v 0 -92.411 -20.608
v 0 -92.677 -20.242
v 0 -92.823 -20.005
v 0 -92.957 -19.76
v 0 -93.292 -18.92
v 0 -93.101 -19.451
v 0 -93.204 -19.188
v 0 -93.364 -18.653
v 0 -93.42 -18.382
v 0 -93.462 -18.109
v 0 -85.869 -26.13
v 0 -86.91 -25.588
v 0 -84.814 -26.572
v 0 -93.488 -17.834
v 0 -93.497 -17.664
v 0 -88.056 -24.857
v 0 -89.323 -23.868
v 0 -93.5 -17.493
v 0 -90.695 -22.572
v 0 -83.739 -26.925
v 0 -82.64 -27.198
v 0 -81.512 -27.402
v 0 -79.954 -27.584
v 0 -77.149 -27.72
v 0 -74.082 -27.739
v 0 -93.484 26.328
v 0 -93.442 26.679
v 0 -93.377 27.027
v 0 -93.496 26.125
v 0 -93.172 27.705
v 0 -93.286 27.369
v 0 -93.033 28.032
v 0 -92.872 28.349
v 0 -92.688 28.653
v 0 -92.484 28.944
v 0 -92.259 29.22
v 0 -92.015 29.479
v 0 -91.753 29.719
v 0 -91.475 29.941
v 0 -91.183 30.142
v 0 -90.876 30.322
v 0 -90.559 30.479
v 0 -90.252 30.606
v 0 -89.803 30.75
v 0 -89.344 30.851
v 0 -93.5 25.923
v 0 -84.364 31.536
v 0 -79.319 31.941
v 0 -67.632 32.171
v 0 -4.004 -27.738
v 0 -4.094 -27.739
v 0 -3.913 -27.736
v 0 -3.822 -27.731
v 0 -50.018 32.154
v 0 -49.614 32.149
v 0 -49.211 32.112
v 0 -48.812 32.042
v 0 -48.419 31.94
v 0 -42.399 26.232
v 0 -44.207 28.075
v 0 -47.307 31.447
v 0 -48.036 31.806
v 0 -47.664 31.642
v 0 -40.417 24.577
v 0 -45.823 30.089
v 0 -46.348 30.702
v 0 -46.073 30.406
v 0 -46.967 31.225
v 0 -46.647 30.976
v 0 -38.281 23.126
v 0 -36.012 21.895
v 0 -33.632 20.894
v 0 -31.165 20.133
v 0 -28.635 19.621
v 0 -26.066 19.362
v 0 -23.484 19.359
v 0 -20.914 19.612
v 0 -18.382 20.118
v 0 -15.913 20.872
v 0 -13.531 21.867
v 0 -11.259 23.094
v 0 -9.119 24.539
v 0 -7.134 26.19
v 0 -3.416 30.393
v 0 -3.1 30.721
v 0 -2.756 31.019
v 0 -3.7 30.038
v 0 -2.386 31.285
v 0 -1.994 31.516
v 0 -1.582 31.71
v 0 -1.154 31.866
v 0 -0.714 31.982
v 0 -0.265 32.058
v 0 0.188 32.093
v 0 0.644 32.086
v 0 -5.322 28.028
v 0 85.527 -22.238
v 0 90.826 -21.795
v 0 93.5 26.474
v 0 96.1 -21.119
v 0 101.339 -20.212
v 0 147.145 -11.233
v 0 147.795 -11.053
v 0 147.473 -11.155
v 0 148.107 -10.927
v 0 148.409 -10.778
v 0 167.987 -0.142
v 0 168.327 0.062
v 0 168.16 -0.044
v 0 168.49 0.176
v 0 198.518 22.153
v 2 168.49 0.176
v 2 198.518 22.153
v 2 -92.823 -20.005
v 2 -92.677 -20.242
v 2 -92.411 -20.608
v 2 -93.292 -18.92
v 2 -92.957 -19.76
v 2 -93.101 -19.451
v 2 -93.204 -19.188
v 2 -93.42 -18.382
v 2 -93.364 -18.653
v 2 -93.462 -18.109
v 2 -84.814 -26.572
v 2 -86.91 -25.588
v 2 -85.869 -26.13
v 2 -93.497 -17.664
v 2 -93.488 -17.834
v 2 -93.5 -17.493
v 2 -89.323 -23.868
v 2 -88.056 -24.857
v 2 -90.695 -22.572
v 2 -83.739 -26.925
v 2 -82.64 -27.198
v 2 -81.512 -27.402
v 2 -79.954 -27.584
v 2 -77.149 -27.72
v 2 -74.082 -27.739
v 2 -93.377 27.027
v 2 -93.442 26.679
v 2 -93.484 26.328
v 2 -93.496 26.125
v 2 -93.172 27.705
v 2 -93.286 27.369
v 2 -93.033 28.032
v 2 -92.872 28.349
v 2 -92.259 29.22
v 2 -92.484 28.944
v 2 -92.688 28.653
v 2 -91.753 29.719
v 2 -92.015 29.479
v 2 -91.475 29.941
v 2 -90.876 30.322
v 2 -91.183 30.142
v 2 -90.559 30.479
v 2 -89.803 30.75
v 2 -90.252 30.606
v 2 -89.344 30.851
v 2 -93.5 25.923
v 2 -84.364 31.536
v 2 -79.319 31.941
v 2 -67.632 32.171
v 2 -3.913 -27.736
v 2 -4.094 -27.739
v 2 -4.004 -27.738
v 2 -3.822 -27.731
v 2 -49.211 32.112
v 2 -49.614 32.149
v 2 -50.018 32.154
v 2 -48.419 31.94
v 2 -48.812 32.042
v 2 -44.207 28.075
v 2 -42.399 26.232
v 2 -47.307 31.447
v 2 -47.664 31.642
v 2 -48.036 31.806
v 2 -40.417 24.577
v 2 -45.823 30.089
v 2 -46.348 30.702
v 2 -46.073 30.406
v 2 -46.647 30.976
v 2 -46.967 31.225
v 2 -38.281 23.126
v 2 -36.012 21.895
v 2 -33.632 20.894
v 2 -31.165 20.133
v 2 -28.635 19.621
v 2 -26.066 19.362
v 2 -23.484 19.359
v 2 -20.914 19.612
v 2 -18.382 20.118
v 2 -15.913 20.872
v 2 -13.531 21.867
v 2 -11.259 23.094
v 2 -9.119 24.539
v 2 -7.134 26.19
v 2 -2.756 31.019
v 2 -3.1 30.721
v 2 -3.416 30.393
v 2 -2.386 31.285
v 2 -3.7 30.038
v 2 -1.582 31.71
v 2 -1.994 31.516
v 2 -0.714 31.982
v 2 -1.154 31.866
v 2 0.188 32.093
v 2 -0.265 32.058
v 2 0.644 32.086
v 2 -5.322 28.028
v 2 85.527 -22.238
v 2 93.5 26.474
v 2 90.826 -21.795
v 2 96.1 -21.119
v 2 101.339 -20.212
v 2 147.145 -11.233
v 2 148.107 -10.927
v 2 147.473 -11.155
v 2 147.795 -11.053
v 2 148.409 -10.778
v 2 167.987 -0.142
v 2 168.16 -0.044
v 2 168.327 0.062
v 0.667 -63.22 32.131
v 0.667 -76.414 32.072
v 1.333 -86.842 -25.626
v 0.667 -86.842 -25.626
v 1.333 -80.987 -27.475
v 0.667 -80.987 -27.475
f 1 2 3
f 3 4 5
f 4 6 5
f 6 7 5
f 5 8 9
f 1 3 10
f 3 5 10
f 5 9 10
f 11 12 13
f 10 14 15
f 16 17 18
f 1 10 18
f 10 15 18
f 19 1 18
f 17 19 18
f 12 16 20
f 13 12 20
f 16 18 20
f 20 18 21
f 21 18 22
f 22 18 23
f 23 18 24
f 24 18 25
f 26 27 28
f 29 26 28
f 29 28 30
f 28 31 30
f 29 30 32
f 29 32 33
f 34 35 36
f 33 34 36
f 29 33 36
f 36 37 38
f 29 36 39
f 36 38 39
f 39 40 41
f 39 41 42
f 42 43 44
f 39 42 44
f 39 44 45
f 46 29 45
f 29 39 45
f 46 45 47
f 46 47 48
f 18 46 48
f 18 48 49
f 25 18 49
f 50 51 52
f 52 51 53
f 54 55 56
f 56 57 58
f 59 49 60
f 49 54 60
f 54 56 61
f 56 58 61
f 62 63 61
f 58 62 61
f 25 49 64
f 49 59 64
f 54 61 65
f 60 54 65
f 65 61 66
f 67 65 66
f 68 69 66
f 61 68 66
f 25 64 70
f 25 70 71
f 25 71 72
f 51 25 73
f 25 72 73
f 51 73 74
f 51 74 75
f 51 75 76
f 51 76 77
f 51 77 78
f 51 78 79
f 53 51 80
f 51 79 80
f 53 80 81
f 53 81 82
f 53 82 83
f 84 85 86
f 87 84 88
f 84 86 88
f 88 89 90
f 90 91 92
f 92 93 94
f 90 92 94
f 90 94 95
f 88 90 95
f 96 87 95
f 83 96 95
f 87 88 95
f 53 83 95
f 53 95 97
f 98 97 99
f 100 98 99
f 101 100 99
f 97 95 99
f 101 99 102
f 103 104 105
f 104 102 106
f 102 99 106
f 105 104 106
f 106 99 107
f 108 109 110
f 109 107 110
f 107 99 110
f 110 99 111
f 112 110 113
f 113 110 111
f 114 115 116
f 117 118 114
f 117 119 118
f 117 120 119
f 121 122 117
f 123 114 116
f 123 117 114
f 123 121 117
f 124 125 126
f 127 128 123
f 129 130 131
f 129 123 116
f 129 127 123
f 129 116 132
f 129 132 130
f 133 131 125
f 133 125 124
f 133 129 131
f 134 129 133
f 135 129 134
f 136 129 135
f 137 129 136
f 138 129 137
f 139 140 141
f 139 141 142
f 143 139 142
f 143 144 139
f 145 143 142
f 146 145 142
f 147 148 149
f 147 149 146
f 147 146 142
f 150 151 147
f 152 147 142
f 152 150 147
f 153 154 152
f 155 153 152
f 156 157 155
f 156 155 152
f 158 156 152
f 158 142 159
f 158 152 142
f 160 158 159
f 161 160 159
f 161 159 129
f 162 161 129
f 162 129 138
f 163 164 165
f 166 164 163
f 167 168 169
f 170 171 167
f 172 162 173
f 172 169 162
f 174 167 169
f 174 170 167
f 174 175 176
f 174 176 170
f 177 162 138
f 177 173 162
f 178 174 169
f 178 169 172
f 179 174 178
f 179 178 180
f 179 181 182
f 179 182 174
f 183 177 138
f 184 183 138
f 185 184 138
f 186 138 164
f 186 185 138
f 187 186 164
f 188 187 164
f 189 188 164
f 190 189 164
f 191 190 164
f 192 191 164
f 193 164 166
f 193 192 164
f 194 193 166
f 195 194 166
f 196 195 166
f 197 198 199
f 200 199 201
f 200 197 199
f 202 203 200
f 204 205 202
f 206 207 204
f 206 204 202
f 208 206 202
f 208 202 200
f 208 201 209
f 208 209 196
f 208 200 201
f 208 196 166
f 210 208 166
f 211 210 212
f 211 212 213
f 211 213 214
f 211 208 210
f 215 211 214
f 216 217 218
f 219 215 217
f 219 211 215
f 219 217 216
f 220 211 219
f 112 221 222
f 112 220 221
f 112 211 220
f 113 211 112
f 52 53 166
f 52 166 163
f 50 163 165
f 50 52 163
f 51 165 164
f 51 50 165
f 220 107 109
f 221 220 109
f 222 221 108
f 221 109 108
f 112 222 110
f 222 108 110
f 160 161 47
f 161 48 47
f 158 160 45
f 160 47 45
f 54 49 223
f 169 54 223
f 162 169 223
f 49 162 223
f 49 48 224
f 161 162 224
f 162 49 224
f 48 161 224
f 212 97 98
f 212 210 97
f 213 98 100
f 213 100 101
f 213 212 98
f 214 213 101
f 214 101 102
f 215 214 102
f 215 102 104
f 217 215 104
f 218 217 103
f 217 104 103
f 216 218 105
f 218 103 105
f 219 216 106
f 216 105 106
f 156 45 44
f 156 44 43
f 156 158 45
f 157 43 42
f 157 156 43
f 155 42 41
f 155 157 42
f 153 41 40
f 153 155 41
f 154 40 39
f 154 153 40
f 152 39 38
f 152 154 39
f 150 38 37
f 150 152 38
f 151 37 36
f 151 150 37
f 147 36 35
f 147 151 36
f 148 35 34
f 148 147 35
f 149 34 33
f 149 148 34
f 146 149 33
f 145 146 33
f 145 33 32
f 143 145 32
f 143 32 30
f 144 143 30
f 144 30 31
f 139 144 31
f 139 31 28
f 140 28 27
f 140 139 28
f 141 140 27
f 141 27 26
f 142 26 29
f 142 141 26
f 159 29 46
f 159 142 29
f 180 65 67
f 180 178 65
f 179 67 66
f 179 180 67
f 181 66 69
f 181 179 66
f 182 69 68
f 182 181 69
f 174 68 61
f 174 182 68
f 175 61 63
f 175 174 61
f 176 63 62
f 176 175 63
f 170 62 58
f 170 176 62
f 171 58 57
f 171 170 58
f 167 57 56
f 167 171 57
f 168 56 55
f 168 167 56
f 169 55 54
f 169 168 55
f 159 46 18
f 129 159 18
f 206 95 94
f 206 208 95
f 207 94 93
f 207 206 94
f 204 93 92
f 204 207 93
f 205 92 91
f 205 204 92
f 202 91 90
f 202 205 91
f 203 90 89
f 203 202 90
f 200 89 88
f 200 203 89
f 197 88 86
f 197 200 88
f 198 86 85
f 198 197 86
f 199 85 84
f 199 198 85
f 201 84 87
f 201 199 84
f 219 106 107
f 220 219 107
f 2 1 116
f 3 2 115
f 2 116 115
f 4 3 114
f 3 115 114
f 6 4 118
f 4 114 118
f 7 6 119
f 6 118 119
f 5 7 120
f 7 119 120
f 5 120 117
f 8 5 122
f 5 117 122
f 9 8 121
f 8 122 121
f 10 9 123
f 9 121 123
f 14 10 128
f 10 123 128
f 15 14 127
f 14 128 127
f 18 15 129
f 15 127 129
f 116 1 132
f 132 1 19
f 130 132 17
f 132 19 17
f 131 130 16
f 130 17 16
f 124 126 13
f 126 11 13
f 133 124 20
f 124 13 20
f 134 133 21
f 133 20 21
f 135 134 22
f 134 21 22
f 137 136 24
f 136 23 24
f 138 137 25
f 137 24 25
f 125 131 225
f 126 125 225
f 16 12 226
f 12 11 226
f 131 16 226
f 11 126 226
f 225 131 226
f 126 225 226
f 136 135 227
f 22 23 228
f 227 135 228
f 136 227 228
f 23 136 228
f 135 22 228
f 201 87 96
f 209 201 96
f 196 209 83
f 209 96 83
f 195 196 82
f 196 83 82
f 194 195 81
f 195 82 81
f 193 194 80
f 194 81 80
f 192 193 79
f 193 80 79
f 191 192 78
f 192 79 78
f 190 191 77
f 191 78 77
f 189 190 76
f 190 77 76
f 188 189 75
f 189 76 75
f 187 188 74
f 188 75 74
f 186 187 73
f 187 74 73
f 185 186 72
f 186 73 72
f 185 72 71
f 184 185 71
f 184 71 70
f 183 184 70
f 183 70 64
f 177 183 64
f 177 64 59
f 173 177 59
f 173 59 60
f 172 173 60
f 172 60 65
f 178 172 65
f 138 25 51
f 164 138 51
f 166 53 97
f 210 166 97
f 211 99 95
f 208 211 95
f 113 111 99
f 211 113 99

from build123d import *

# Parameters (mm, degrees)
F1_DEPTH    = 2
F2_R        = 5
F3_R        = 120.7003354098
F4_T1_DEPTH = 5.3985988059
F4_T3_DEPTH = 3.4901996791
F4_T5_DEPTH = 2.6811462233


# Not quite as in the source:
# - a fillet or chamfer that OpenCascade refuses, or shapes differently, is made with other operations: its cross-section is extruded or revolved along the edge and cut away or added
# - a feature names something its author has since deleted; it is built from what else it names


with BuildPart() as f1:
    # F0 (on Right) → F1 (new body)
    with BuildSketch(Plane.YZ):
        with BuildLine():
            add(Edge.make_bspline(
                [(-93.5, -19.165366888), (-87.3498469591, -27.7392359194), (-82.2530835867, -27.7392359194), (-74.081517756, -27.7392359194)],
                knots=[0, 0, 0, 0, 21.227074288, 21.227074288, 21.227074288, 21.227074288], degree=3))
            Line((-74.081517756, -27.7392359194), (-3.9580739103, -27.7392359194))
            Line((-3.9580739103, -27.7392359194), (93.5, -21.748252213))
            Line((93.5, -21.748252213), (147.8121578693, -11.1020449549))
            Line((147.8121578693, -11.1020449549), (168.2493239641, 0))
            Line((168.2493239641, 0), (198.5184252262, 22.1527013928))
            Line((198.5184252262, 22.1527013928), (93.5, 26.4736590703))
            Line((93.5, 26.4736590703), (-2.2493870929, 32.2607640806))
            ThreePointArc((-2.2493870929, 32.2607640806), (-24.7432854958, 19.3285844403), (-47.2371838987, 32.2607640806))
            add(Edge.make_bspline(
                [(-47.2371838987, 32.2607640806), (-62.6581225991, 31.5082555435), (-78.7113010883, 33.5351414979), (-93.5, 30.0032384694)],
                knots=[0, 0, 0, 0, 46.3178645396, 46.3178645396, 46.3178645396, 46.3178645396], degree=3))
            Line((-93.5, 30.0032384694), (-93.5, -19.165366888))
        make_face()
    extrude(amount=F1_DEPTH)

    # F2
    f2_edges = [f1.edges().sort_by_distance(p)[0] for p in [
        (1, -93.5, 30.003238),
        (1, -47.237184, 32.260764),
        (1, -2.249387, 32.260764),
        (1, -93.5, -19.165367),
        (1, -3.958074, -27.739236),
    ]]
    fillet(f2_edges, radius=F2_R)

    # F3
    f3_edges = [f1.edges().sort_by_distance(p)[0] for p in [
        (1, 93.5, -21.748252),
    ]]
    fillet(f3_edges, radius=F3_R)

    # F4: fillet of radius 4.436390167 on 3 edges, made by hand

    # F4_s2 → F4_t1 (cut)
    with BuildSketch(Plane.YZ.offset(-1.699299403)):
        with BuildLine():
            ThreePointArc((147.14513202, -11.2327946013), (147.7946205368, -11.0533364649), (148.4094389633, -10.7775850212))
            Line((148.4094389633, -10.7775850212), (147.8121578693, -11.1020449549))
            Line((147.8121578693, -11.1020449549), (147.14513202, -11.2327946013))
        make_face()
    extrude(amount=F4_T1_DEPTH, mode=Mode.SUBTRACT)

    # F4_s4 → F4_t3 (cut)
    with BuildSketch(Plane.YZ.offset(-0.7450998395)):
        with BuildLine():
            ThreePointArc((167.9874313003, -0.1422674804), (168.2439722622, 0.0084474426), (168.4898338923, 0.176019254))
            Line((168.4898338923, 0.176019254), (168.2493239641, 0))
            Line((168.2493239641, 0), (167.9874313003, -0.1422674804))
        make_face()
    extrude(amount=F4_T3_DEPTH, mode=Mode.SUBTRACT)

    # F4_s6 → F4_t5 (cut)
    with BuildSketch(Plane.YZ.offset(-0.3405731116)):
        with BuildLine():
            ThreePointArc((-3.822101334, -27.730877356), (-3.9581380925, -27.7371457861), (-4.094303155, -27.7392359194))
            Line((-4.094303155, -27.7392359194), (-3.9580739103, -27.7392359194))
            Line((-3.9580739103, -27.7392359194), (-3.822101334, -27.730877356))
        make_face()
    extrude(amount=F4_T5_DEPTH, mode=Mode.SUBTRACT)


solid = f1.part
